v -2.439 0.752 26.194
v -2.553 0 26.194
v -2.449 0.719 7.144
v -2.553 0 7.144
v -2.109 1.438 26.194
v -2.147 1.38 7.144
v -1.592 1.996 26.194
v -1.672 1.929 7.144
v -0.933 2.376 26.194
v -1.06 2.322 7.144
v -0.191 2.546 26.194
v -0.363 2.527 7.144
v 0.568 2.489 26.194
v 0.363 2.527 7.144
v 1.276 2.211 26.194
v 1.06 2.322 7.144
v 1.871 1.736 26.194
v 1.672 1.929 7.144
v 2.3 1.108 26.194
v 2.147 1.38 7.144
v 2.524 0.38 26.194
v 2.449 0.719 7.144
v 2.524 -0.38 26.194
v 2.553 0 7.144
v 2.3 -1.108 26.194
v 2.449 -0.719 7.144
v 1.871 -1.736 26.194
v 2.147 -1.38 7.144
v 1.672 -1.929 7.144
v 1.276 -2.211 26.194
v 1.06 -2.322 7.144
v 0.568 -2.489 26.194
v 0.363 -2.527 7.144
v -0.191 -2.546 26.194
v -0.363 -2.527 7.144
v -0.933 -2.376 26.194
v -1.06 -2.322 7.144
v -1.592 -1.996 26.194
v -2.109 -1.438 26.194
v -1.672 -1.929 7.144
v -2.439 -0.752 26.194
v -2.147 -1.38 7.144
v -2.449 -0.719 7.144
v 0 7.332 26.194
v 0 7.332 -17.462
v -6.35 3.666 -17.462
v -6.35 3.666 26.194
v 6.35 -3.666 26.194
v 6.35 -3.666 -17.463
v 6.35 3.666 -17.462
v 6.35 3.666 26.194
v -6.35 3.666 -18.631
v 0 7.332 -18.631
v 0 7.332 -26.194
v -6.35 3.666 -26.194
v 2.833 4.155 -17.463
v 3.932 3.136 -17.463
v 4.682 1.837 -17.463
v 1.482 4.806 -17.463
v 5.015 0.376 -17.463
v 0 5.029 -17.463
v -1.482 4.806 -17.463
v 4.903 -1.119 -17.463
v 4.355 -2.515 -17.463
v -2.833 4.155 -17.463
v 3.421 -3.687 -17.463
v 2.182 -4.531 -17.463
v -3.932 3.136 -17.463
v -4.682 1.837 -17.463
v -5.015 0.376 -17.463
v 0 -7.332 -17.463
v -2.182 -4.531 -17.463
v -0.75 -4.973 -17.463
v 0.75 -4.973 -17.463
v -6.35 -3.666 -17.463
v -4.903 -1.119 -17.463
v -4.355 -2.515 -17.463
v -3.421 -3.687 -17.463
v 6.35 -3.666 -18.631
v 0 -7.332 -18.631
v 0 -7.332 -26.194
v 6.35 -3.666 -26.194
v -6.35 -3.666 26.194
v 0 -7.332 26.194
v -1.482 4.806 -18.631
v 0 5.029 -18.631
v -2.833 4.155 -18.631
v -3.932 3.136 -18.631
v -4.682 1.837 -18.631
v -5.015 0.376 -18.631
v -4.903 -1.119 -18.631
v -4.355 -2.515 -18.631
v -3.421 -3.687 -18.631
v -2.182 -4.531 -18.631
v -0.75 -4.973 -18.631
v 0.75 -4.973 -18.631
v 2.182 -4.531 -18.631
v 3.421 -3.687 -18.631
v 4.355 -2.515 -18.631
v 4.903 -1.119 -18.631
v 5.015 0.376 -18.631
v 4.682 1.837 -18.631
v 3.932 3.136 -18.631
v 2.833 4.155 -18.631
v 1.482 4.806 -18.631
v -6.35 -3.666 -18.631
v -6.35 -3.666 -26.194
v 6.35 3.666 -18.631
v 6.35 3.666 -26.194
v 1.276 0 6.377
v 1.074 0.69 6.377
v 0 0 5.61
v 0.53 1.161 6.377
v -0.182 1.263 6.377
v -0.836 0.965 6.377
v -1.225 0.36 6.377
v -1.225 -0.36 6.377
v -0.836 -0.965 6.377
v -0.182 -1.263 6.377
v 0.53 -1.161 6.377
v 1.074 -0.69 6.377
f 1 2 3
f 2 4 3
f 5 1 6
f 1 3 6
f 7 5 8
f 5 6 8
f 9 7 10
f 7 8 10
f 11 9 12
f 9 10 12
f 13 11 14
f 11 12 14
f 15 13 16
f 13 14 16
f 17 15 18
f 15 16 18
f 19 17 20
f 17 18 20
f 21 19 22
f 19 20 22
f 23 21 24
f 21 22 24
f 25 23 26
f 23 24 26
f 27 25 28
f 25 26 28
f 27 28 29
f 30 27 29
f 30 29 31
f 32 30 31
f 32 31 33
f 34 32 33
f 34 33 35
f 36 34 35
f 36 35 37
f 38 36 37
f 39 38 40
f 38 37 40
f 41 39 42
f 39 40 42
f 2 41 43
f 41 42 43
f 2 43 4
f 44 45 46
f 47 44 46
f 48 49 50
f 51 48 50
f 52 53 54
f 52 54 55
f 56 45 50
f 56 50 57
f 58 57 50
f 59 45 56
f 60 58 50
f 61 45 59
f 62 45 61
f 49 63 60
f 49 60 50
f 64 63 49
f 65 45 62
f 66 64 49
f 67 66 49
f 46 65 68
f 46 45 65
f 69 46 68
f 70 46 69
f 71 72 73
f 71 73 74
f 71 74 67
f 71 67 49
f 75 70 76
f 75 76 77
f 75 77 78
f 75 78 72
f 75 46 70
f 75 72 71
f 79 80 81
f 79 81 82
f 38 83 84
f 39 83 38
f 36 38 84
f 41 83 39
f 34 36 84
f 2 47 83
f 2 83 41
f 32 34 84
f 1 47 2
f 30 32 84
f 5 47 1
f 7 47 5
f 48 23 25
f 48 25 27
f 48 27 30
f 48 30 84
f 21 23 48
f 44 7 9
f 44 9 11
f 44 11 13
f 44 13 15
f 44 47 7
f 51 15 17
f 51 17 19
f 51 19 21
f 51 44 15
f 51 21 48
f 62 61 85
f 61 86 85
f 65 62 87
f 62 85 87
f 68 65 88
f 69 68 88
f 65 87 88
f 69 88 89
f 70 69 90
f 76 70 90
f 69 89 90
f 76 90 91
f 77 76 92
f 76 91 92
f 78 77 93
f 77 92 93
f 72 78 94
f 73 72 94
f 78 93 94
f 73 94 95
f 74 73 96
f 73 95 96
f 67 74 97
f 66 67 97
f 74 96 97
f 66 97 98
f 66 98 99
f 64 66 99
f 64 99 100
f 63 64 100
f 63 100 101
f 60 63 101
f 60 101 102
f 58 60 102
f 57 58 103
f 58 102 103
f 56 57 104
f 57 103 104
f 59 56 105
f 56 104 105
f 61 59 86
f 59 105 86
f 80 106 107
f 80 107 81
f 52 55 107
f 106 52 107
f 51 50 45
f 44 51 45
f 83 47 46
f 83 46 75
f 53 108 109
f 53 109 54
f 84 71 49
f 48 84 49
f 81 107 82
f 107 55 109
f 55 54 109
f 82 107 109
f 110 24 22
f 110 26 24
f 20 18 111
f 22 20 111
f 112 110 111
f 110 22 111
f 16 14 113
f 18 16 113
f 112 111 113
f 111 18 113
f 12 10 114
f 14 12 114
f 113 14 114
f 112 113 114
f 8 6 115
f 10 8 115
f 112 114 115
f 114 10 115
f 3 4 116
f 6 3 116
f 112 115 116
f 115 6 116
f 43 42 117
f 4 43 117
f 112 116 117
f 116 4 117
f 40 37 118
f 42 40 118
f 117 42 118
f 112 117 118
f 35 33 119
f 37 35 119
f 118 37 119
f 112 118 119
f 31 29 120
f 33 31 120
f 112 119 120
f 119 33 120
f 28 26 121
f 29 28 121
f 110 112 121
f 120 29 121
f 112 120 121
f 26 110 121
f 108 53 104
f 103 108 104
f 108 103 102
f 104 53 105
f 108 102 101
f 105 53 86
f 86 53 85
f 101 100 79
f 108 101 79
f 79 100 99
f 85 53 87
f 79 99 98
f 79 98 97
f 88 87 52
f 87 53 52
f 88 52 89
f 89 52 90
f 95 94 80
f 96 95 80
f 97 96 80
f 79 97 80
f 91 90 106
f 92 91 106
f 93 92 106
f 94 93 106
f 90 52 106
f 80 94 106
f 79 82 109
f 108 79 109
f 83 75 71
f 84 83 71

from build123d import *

# Parameters (mm, degrees)
BOSS_EXTRUDE1_DEPTH         = 26.19375
F_1_4_20_TAPPED_HOLE1_D     = 5.1054
F_1_4_20_TAPPED_HOLE1_DEPTH = 19.05
F_1_4_20_TAPPED_HOLE1_TIP   = 1.533816902
SKETCH5_W                   = 1.1684
SKETCH5_H                   = 4.843148419


with BuildPart() as part:
    # Sketch1 → Boss-Extrude1 (new body, symmetric)
    with BuildSketch(Plane.XY):
        Polygon((-6.35, 3.666174209), (-6.35, -3.666174209), (0, -7.332348419), (6.35, -3.666174209), (6.35, 3.666174209), (0, 7.332348419), align=None)
    extrude(amount=BOSS_EXTRUDE1_DEPTH, both=True)

    # 1/4-20 Tapped Hole1
    with Locations(Plane.XY.offset(26.19375)):
        with Locations((0, 0)):
            Hole(F_1_4_20_TAPPED_HOLE1_D / 2, depth=F_1_4_20_TAPPED_HOLE1_DEPTH)
            with Locations((0, 0, -(F_1_4_20_TAPPED_HOLE1_DEPTH + F_1_4_20_TAPPED_HOLE1_TIP / 2))):  # 118° drill point
                Cone(0, F_1_4_20_TAPPED_HOLE1_D / 2, F_1_4_20_TAPPED_HOLE1_TIP, mode=Mode.SUBTRACT)

    # Sketch5 → Cut-Revolve1 (revolve, cut)
    with BuildSketch(Plane(origin=(0, 0, 0), x_dir=(0, 0, -1), z_dir=(1, 0, 0))):
        with Locations((18.0467, 7.45077421)):
            Rectangle(SKETCH5_W, SKETCH5_H)
    revolve(axis=Axis((0, 0, -26.19375), (0, 0, 1)), mode=Mode.SUBTRACT)


solid = part.part
